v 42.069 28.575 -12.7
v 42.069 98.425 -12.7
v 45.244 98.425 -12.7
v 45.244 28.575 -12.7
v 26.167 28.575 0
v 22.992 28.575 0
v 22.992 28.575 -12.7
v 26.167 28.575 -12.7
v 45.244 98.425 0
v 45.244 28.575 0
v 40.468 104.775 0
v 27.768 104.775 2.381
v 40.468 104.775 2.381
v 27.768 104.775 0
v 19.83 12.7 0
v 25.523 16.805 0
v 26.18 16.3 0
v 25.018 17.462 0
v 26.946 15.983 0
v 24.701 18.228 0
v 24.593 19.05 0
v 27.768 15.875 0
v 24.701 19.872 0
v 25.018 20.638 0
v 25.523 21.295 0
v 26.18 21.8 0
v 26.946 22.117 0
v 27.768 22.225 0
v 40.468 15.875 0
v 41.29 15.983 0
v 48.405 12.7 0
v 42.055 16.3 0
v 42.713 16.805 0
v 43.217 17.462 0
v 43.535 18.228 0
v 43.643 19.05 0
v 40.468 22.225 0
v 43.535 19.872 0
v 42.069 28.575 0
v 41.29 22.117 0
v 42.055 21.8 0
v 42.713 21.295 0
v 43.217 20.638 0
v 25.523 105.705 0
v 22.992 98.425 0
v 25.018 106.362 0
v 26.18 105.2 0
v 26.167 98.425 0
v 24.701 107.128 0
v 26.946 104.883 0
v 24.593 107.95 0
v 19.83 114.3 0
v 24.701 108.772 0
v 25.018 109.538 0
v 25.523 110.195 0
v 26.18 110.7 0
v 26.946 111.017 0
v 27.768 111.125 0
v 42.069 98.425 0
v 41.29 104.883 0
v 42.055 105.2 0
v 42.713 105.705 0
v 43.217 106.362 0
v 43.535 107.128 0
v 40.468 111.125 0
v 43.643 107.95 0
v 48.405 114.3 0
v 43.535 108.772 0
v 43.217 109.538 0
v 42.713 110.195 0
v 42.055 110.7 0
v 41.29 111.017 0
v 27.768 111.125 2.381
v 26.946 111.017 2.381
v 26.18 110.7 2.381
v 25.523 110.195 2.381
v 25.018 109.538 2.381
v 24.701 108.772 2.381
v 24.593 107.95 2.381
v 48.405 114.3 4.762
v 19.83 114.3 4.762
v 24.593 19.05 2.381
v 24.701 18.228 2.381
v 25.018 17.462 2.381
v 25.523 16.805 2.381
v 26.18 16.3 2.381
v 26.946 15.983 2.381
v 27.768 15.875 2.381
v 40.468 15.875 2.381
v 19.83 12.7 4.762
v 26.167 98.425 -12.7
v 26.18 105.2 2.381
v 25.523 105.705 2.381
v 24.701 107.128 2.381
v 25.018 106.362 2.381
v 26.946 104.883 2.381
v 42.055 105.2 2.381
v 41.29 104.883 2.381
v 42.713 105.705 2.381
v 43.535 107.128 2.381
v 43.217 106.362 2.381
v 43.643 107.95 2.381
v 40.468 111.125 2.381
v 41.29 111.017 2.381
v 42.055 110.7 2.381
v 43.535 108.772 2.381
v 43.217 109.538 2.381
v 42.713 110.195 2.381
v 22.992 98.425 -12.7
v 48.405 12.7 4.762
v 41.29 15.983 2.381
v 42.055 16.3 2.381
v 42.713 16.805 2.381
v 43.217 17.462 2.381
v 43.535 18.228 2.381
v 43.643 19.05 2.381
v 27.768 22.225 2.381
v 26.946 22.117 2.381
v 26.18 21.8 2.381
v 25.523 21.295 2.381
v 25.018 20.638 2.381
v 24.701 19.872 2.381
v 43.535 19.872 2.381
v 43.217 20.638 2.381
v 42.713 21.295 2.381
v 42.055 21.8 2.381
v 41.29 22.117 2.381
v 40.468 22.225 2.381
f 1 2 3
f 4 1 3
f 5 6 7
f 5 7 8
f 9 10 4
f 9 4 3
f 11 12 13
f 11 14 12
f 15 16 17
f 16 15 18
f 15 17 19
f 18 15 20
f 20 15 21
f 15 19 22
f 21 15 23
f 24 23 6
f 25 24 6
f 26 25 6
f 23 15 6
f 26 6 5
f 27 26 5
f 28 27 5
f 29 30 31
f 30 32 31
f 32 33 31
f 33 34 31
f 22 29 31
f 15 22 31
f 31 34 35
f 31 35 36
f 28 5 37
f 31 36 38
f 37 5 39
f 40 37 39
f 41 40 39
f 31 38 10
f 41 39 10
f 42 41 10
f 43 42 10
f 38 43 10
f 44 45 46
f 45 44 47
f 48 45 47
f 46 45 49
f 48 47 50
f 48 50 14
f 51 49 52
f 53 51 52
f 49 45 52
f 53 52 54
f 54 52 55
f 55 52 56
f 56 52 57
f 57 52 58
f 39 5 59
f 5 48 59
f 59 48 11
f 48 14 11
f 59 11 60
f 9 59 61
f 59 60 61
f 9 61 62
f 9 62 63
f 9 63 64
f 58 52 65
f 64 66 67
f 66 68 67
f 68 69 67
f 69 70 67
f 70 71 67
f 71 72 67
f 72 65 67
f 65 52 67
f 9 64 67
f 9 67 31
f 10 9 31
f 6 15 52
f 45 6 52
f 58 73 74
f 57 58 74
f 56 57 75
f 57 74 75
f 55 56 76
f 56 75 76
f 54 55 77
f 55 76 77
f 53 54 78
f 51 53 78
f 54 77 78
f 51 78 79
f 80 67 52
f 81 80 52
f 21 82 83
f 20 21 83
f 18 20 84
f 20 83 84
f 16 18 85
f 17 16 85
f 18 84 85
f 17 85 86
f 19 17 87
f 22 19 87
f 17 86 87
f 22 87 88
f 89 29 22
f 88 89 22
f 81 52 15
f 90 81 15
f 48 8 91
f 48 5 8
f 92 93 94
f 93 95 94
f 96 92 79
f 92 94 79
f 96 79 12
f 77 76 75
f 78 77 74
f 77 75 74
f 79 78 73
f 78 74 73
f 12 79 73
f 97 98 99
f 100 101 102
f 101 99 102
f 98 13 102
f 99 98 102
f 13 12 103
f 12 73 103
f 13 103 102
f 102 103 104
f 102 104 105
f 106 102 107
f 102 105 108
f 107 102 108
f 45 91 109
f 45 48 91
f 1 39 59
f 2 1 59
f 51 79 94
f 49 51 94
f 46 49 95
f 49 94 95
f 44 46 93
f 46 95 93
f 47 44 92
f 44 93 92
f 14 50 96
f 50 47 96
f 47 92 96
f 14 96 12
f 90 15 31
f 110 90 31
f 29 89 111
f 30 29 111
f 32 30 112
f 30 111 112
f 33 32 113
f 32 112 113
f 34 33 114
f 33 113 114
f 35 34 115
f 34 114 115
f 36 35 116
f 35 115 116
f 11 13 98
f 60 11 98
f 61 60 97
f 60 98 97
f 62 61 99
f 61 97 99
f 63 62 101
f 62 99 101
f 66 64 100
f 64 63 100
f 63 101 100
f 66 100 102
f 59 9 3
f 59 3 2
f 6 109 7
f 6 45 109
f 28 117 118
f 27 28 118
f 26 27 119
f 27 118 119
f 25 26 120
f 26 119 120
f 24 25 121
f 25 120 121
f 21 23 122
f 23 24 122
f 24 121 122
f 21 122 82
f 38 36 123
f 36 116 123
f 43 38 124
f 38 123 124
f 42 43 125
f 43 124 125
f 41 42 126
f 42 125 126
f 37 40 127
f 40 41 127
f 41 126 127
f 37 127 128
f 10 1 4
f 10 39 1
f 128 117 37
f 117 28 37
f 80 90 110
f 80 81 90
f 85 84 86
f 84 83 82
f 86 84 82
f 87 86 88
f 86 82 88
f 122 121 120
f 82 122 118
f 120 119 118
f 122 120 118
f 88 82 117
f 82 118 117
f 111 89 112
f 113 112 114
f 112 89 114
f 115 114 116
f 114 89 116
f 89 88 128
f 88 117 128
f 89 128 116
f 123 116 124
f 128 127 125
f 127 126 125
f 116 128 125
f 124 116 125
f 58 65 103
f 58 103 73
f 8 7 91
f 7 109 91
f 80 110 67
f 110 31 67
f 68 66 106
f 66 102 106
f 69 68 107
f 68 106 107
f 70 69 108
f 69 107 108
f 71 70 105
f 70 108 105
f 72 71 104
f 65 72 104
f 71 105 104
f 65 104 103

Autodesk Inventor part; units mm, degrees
ref_plane "YZ Plane" through (0, 0, 0) normal (1, 0, 0) x (0, 1, 0)
ref_plane "XZ Plane" through (0, 0, 0) normal (0, 1, 0) x (-1, 0, 0)
ref_plane "XY Plane" through (0, 0, 0) normal (0, 0, 1) x (1, 0, 0)
sketch "Sketch1" plane through (0, 0, 0) normal (0, 0, 1) x (1, 0, 0)
  line L0 (0, 0) -> (50.8, 0) construction
  line L1 (50.8, 0) -> (50.8, 127) construction
  line L2 (50.8, 127) -> (0, 127) construction
  line L3 (0, 127) -> (0, 0) construction
  line L4 (0, 63.5) -> (50.8, 63.5) construction
  line L5 (25.4, 127) -> (25.4, 0) construction
  line L6 (6.7469, 46) -> (44.0531, 46) construction
  line L7 (44.0531, 46) -> (44.0531, 81) construction
  line L8 (44.0531, 81) -> (6.7469, 81) construction
  line L9 (6.7469, 81) -> (6.7469, 46) construction
  line L10 (41.6177, 127) -> (41.6177, 0) construction
  line L11 (26.6177, 127) -> (26.6177, 0) construction
  line L12 (45.2437, 28.575) -> (45.2437, 98.425)
  line L13 (45.2437, 98.425) -> (22.9917, 98.425)
  line L14 (22.9917, 98.425) -> (22.9917, 28.575)
  line L15 (22.9917, 28.575) -> (45.2437, 28.575)
  line L16 (42.0688, 28.575) -> (42.0688, 98.425)
  line L17 (26.1667, 28.575) -> (26.1667, 98.425)
  line L18 (24.5927, 22.225) -> (43.6427, 22.225)
  line L19 (43.6427, 22.225) -> (43.6427, 15.875)
  line L20 (43.6427, 15.875) -> (24.5927, 15.875)
  line L21 (24.5927, 15.875) -> (24.5927, 22.225)
  line L22 (34.1177, 0) -> (34.1177, 127) construction
  line L23 (43.6427, 111.125) -> (24.5927, 111.125)
  line L24 (24.5927, 111.125) -> (24.5927, 104.775)
  line L25 (24.5927, 104.775) -> (43.6427, 104.775)
  line L26 (43.6427, 104.775) -> (43.6427, 111.125)
  line L27 (19.8302, 12.7) -> (48.4052, 12.7)
  line L28 (48.4052, 12.7) -> (48.4052, 114.3)
  line L29 (48.4052, 114.3) -> (19.8302, 114.3)
  line L30 (19.8302, 114.3) -> (19.8302, 12.7)
  dimension "d0" = 50.8
  dimension "d1" = 127
  dimension "d2" = 35
  dimension "d3" = 37.3062
  dimension "d4" = 15
  dimension "d5" = 2.4354
  dimension "d6" = 5.5563
  dimension "d7" = 3.175
  dimension "d8" = 0.451
  dimension "d9" = 0.451
  dimension "d10" = 3.175
  dimension "d11" = 69.85
  dimension "d12" = 19.05
  dimension "d13" = 6.35
  dimension "d14" = 6.35
  dimension "d15" = 6.35
  dimension "d16" = 19.05
  dimension "d17" = 6.35
  dimension "d18" = 3.175
  dimension "d21" = 3.175
  dimension "d30" = 28.575
  dimension "d32" = 3.1615
  dimension "d33" = 3.1615
extrude "Main Cover Profile" add sketch "Sketch1" along normal blind 4.7625 contours L15 L16 L13 L12 | L15 L17 L13 L16 | L15 L14 L13 L17 | L18 L19 L20 L21 | L26 L25 L24 L23 | L30 L29 L28 L27
extrude "Magnet Pockets" cut sketch "Sketch1" along normal blind 2.3813 contours L18 L19 L20 L21 | L26 L25 L24 L23
extrude "Belt Aligning Tabs" add sketch "Sketch1" against normal blind 12.7 contours L15 L16 L13 L12 | L15 L14 L13 L17
fillet "Fillet1" radius 3.175 8 edges at (43.6427, 22.225, 1.1906) (43.6427, 15.875, 1.1906) (24.5927, 15.875, 1.1906) (24.5927, 22.225, 1.1906) (43.6427, 104.775, 1.1906) (43.6427, 111.125, 1.1906) (24.5927, 104.775, 1.1906) (24.5927, 111.125, 1.1906)
equation "\"d5\" = -0.666667 * d4 + 0.333333 * d3"
equation "\"d9\" = d8"
equation "\"d10\" = d7"
equation "\"d12\" = d16"
equation "\"d13\" = d15"
properties part number "Belt Aligner MagLock" material "Polyethylene, High Density"
